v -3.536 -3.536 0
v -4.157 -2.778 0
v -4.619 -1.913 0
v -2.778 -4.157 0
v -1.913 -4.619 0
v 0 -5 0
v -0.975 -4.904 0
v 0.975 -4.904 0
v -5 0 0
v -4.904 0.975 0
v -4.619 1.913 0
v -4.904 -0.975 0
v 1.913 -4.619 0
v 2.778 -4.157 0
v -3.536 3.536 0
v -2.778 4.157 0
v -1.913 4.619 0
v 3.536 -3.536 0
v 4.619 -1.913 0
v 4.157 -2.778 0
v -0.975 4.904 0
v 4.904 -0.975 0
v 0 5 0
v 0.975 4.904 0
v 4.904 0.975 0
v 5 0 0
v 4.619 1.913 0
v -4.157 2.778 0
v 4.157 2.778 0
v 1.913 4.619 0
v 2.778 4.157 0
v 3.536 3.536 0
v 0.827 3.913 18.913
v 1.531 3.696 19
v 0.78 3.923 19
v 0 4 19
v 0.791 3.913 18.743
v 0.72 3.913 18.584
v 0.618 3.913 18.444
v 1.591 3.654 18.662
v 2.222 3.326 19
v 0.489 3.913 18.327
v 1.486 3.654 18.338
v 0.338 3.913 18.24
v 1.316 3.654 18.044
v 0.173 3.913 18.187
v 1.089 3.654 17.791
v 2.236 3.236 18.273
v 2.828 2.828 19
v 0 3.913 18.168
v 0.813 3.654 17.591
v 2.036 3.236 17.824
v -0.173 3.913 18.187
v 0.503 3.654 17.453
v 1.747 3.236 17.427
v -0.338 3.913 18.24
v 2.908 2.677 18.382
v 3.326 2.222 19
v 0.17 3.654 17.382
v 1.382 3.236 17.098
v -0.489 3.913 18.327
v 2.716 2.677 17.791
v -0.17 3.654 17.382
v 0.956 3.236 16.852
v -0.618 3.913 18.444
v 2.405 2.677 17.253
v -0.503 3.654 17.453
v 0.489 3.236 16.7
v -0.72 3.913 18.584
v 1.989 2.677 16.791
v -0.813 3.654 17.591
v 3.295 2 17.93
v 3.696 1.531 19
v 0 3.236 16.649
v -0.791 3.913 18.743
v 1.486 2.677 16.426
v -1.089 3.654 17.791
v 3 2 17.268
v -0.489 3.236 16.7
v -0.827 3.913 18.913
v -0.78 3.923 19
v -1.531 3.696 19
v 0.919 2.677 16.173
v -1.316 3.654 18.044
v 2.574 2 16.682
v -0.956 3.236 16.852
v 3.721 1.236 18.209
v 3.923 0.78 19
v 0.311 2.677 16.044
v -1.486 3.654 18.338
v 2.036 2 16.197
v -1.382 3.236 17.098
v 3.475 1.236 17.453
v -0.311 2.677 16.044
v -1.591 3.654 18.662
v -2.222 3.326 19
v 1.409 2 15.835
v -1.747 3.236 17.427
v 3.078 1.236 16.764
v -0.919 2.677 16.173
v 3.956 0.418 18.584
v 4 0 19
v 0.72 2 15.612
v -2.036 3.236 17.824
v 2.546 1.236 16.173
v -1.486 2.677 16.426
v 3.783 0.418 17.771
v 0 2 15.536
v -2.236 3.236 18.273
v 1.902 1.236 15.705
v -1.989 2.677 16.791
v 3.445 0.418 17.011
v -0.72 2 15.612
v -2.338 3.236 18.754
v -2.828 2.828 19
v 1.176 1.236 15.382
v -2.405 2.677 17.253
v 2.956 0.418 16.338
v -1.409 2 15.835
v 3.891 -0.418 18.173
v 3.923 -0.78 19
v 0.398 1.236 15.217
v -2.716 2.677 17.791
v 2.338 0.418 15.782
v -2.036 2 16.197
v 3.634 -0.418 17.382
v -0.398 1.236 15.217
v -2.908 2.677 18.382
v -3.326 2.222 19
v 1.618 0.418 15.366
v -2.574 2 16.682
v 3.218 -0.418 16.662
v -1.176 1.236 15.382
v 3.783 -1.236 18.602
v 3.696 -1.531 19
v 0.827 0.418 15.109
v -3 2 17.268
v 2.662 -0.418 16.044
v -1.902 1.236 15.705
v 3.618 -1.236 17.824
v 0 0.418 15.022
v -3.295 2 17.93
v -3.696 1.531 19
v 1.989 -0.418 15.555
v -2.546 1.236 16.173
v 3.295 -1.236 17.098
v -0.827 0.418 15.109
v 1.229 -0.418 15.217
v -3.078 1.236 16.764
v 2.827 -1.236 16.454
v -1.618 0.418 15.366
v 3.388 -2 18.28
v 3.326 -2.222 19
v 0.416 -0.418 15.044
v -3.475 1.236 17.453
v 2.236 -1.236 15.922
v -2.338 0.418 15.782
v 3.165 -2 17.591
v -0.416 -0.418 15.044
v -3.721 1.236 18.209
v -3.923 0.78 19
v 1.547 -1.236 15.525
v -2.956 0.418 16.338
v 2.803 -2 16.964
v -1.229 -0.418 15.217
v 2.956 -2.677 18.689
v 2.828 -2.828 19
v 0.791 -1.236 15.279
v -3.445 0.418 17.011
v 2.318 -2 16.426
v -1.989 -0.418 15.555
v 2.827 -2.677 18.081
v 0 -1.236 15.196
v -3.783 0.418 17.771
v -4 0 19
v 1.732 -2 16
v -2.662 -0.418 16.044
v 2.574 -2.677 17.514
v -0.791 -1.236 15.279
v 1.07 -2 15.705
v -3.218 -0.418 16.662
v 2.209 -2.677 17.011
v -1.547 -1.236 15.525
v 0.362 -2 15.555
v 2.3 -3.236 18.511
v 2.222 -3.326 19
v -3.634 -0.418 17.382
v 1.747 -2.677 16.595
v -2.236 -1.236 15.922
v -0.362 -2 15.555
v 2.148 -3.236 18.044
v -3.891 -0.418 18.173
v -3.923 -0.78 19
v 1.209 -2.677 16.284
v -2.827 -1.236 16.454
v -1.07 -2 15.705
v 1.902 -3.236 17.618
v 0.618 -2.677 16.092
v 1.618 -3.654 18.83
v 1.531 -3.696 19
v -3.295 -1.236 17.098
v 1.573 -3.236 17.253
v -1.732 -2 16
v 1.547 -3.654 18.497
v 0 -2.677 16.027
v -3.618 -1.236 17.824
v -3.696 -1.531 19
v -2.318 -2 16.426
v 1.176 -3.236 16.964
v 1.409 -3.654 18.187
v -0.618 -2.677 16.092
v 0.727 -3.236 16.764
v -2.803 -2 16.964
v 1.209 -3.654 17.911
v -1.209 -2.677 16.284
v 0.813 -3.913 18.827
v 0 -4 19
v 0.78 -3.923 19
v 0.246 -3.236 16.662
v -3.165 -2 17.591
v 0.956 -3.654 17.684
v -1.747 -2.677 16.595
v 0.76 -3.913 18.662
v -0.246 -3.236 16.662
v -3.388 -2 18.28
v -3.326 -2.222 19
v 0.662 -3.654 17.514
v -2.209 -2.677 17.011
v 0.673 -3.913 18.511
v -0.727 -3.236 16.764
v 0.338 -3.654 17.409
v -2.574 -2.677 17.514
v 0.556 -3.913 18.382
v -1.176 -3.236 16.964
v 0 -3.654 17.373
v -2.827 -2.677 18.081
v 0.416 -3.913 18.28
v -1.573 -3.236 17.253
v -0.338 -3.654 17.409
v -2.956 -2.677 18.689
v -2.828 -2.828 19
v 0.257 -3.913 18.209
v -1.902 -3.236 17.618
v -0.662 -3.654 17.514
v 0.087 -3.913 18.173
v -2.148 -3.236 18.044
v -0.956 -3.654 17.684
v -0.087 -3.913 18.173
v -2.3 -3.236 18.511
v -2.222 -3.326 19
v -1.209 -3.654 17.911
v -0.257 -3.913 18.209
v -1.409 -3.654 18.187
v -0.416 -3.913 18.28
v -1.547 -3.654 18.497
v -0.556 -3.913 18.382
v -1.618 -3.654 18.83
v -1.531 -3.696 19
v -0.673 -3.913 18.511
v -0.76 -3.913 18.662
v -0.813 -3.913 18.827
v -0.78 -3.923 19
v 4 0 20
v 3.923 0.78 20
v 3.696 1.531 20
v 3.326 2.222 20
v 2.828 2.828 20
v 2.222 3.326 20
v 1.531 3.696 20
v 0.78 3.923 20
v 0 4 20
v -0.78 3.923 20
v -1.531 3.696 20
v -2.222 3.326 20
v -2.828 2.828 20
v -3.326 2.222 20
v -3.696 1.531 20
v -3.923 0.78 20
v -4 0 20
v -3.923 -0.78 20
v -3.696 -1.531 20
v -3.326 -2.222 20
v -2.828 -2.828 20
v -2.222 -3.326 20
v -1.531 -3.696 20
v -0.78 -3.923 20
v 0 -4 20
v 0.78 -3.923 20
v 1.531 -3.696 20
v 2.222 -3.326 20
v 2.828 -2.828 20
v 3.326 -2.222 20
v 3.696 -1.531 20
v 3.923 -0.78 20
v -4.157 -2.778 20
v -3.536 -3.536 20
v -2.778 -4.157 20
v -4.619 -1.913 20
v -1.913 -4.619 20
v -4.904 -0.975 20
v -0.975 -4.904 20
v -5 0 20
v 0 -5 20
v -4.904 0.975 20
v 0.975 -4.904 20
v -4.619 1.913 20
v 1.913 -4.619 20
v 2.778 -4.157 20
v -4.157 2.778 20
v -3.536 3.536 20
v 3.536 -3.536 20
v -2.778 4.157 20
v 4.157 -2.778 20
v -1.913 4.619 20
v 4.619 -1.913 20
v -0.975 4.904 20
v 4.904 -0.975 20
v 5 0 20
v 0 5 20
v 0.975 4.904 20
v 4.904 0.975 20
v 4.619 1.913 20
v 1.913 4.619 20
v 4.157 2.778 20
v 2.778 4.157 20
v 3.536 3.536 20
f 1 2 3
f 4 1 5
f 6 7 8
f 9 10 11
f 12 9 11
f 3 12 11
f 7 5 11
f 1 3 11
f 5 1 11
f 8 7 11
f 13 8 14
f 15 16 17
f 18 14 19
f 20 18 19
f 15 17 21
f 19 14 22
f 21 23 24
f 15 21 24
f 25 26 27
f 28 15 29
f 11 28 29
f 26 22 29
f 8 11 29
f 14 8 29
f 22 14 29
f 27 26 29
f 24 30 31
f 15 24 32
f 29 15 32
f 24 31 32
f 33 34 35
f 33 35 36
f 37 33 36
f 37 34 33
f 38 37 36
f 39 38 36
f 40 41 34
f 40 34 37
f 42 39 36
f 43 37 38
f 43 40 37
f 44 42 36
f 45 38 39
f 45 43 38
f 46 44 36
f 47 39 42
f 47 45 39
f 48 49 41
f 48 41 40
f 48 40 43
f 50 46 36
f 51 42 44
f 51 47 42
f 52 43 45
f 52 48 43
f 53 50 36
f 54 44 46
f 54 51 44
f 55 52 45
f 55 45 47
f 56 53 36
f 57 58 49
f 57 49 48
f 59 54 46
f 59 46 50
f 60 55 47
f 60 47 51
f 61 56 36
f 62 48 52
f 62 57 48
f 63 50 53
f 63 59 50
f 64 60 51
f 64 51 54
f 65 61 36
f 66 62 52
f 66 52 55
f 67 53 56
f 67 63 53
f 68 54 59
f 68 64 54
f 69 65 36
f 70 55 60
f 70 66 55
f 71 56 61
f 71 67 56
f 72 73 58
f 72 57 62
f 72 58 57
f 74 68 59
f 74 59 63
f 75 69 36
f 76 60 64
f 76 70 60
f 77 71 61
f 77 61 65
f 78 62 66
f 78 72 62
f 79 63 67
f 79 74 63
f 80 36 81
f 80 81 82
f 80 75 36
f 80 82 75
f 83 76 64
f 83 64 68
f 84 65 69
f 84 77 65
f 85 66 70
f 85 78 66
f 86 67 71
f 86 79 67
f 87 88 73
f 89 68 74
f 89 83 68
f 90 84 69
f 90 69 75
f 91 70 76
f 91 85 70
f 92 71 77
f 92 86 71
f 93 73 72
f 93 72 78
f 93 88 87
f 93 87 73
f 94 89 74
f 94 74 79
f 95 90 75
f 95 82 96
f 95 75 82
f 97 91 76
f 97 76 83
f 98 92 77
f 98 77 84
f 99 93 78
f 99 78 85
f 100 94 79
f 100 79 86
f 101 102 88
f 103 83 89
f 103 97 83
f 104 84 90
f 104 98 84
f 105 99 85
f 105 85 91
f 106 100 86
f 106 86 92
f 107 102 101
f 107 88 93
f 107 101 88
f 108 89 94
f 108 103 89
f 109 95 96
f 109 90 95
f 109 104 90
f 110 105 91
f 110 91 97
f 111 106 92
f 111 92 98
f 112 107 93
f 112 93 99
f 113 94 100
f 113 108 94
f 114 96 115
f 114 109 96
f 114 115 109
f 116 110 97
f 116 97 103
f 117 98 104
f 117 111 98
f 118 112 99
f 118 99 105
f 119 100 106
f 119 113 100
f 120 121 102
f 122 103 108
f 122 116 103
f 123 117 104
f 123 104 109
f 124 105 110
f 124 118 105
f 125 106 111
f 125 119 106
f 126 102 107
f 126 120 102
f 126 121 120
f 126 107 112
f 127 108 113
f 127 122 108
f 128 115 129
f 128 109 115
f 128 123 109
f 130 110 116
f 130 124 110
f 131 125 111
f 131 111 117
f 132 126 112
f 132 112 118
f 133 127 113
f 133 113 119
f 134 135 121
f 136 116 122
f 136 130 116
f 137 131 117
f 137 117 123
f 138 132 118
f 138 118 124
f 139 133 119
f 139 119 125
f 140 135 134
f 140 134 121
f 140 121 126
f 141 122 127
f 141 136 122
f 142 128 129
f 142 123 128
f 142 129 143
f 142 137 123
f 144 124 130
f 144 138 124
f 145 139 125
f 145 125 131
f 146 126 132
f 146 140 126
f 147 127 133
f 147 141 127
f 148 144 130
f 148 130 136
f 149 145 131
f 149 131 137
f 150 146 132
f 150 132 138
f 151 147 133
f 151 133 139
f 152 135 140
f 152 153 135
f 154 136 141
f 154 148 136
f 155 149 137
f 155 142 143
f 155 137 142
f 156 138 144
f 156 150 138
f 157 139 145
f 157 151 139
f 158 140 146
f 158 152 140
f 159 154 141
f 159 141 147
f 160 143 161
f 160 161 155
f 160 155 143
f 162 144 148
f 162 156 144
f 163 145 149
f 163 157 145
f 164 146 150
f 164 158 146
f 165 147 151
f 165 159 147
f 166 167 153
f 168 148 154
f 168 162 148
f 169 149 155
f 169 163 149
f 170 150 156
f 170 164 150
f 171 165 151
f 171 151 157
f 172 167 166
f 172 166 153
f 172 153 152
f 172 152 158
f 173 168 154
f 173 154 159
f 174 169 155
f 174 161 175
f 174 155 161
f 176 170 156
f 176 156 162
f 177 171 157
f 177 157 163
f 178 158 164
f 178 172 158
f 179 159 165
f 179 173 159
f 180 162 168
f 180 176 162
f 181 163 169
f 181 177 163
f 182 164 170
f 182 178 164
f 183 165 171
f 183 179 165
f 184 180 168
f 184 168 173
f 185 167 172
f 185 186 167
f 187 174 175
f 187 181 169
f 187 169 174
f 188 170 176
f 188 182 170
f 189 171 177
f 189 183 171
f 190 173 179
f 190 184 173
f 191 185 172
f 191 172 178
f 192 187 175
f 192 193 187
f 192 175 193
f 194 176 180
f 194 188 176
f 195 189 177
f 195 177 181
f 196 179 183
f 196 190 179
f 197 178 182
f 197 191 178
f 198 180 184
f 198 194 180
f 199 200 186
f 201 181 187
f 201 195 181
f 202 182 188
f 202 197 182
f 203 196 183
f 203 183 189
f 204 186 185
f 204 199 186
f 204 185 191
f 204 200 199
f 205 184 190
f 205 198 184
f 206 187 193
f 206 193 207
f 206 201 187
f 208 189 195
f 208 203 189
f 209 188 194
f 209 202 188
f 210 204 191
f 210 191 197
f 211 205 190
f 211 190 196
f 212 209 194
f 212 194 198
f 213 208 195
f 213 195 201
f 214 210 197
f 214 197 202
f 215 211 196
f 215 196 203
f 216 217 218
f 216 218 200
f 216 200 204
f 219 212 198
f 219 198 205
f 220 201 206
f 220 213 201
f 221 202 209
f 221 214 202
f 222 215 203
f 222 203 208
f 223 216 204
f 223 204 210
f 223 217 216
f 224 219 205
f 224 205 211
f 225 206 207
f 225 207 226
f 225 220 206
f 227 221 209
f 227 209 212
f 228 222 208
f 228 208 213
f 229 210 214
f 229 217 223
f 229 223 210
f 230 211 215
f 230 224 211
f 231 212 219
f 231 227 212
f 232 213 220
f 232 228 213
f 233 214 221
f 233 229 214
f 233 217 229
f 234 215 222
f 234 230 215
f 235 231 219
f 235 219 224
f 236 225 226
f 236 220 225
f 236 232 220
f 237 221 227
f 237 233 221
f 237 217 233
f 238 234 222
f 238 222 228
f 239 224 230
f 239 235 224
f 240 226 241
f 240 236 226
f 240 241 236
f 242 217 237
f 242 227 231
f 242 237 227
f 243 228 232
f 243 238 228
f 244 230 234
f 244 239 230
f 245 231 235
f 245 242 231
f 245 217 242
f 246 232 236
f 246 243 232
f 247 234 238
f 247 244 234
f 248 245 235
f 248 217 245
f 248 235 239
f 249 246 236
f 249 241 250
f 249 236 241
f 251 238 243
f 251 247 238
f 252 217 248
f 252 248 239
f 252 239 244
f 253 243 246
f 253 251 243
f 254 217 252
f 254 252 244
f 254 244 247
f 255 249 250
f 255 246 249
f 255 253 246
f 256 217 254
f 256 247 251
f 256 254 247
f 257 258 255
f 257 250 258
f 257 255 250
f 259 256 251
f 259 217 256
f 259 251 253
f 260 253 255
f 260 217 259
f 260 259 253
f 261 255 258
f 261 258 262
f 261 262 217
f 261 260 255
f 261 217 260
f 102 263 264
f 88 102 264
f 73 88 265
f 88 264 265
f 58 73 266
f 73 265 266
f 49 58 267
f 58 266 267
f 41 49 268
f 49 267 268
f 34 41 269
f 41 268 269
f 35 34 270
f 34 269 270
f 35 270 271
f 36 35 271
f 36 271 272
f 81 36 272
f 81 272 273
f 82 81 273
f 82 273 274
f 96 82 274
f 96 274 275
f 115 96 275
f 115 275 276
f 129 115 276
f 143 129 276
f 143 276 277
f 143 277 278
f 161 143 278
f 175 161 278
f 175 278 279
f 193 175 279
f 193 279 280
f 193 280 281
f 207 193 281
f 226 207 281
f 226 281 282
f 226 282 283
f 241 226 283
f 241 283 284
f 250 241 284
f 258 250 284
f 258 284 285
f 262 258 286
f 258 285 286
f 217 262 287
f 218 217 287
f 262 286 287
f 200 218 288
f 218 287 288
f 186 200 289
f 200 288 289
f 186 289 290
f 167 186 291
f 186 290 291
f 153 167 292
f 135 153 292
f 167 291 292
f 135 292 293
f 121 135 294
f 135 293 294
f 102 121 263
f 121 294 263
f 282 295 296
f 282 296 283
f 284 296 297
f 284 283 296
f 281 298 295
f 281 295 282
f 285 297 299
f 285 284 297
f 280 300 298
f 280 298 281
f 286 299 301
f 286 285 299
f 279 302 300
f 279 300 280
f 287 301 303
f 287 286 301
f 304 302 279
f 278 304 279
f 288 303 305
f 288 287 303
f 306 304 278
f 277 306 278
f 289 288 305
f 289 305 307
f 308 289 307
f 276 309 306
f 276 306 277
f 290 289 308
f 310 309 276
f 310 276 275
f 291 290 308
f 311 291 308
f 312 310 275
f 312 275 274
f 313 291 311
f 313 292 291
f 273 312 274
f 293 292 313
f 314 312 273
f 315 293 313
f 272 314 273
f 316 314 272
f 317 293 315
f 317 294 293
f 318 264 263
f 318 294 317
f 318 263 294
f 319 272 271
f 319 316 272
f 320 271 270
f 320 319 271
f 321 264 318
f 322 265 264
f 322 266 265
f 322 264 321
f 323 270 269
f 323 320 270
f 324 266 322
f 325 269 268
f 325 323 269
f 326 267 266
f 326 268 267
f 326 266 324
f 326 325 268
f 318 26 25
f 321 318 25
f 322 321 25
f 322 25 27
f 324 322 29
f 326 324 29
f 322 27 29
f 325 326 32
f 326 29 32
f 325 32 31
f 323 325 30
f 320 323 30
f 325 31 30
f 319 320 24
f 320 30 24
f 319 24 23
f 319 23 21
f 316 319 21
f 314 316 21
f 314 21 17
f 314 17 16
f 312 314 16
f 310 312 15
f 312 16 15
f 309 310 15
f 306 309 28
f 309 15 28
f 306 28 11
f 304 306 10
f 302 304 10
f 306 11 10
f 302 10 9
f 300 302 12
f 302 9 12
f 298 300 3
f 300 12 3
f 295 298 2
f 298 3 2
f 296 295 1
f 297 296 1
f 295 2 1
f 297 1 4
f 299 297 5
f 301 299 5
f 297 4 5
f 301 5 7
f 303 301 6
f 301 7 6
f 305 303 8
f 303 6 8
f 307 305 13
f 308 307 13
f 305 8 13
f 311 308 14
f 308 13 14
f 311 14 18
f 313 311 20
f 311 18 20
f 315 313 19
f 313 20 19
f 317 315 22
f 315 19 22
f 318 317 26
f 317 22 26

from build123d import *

# Parameters (mm, degrees)
SCHIZZO1_R                   = 5
ESTRUSIONE_ESTRUSIONE1_DEPTH = 20
SCHIZZO2_R                   = 4
TAGLIO_ESTRUSIONE1_DEPTH     = 1


with BuildPart() as part:
    # Schizzo1 → Estrusione-Estrusione1 (new body)
    with BuildSketch(Plane.XY):
        Circle(SCHIZZO1_R)
    extrude(amount=ESTRUSIONE_ESTRUSIONE1_DEPTH)

    # Schizzo2 → Taglio-Estrusione1 (cut)
    with BuildSketch(Plane.XY.offset(20)):
        Circle(SCHIZZO2_R)
    extrude(amount=-TAGLIO_ESTRUSIONE1_DEPTH, mode=Mode.SUBTRACT)

    # Schizzo15 → Taglia-Rivoluzione2 (revolve, cut)
    with BuildSketch(Plane.XY.offset(19)):
        with BuildLine():
            Line((0, -4), (0, 4))
            ThreePointArc((0, 4), (-4, 0), (0, -4))
        make_face()
    revolve(axis=Axis((0, -4, 19), (0, 1, 0)), mode=Mode.SUBTRACT)


solid = part.part
